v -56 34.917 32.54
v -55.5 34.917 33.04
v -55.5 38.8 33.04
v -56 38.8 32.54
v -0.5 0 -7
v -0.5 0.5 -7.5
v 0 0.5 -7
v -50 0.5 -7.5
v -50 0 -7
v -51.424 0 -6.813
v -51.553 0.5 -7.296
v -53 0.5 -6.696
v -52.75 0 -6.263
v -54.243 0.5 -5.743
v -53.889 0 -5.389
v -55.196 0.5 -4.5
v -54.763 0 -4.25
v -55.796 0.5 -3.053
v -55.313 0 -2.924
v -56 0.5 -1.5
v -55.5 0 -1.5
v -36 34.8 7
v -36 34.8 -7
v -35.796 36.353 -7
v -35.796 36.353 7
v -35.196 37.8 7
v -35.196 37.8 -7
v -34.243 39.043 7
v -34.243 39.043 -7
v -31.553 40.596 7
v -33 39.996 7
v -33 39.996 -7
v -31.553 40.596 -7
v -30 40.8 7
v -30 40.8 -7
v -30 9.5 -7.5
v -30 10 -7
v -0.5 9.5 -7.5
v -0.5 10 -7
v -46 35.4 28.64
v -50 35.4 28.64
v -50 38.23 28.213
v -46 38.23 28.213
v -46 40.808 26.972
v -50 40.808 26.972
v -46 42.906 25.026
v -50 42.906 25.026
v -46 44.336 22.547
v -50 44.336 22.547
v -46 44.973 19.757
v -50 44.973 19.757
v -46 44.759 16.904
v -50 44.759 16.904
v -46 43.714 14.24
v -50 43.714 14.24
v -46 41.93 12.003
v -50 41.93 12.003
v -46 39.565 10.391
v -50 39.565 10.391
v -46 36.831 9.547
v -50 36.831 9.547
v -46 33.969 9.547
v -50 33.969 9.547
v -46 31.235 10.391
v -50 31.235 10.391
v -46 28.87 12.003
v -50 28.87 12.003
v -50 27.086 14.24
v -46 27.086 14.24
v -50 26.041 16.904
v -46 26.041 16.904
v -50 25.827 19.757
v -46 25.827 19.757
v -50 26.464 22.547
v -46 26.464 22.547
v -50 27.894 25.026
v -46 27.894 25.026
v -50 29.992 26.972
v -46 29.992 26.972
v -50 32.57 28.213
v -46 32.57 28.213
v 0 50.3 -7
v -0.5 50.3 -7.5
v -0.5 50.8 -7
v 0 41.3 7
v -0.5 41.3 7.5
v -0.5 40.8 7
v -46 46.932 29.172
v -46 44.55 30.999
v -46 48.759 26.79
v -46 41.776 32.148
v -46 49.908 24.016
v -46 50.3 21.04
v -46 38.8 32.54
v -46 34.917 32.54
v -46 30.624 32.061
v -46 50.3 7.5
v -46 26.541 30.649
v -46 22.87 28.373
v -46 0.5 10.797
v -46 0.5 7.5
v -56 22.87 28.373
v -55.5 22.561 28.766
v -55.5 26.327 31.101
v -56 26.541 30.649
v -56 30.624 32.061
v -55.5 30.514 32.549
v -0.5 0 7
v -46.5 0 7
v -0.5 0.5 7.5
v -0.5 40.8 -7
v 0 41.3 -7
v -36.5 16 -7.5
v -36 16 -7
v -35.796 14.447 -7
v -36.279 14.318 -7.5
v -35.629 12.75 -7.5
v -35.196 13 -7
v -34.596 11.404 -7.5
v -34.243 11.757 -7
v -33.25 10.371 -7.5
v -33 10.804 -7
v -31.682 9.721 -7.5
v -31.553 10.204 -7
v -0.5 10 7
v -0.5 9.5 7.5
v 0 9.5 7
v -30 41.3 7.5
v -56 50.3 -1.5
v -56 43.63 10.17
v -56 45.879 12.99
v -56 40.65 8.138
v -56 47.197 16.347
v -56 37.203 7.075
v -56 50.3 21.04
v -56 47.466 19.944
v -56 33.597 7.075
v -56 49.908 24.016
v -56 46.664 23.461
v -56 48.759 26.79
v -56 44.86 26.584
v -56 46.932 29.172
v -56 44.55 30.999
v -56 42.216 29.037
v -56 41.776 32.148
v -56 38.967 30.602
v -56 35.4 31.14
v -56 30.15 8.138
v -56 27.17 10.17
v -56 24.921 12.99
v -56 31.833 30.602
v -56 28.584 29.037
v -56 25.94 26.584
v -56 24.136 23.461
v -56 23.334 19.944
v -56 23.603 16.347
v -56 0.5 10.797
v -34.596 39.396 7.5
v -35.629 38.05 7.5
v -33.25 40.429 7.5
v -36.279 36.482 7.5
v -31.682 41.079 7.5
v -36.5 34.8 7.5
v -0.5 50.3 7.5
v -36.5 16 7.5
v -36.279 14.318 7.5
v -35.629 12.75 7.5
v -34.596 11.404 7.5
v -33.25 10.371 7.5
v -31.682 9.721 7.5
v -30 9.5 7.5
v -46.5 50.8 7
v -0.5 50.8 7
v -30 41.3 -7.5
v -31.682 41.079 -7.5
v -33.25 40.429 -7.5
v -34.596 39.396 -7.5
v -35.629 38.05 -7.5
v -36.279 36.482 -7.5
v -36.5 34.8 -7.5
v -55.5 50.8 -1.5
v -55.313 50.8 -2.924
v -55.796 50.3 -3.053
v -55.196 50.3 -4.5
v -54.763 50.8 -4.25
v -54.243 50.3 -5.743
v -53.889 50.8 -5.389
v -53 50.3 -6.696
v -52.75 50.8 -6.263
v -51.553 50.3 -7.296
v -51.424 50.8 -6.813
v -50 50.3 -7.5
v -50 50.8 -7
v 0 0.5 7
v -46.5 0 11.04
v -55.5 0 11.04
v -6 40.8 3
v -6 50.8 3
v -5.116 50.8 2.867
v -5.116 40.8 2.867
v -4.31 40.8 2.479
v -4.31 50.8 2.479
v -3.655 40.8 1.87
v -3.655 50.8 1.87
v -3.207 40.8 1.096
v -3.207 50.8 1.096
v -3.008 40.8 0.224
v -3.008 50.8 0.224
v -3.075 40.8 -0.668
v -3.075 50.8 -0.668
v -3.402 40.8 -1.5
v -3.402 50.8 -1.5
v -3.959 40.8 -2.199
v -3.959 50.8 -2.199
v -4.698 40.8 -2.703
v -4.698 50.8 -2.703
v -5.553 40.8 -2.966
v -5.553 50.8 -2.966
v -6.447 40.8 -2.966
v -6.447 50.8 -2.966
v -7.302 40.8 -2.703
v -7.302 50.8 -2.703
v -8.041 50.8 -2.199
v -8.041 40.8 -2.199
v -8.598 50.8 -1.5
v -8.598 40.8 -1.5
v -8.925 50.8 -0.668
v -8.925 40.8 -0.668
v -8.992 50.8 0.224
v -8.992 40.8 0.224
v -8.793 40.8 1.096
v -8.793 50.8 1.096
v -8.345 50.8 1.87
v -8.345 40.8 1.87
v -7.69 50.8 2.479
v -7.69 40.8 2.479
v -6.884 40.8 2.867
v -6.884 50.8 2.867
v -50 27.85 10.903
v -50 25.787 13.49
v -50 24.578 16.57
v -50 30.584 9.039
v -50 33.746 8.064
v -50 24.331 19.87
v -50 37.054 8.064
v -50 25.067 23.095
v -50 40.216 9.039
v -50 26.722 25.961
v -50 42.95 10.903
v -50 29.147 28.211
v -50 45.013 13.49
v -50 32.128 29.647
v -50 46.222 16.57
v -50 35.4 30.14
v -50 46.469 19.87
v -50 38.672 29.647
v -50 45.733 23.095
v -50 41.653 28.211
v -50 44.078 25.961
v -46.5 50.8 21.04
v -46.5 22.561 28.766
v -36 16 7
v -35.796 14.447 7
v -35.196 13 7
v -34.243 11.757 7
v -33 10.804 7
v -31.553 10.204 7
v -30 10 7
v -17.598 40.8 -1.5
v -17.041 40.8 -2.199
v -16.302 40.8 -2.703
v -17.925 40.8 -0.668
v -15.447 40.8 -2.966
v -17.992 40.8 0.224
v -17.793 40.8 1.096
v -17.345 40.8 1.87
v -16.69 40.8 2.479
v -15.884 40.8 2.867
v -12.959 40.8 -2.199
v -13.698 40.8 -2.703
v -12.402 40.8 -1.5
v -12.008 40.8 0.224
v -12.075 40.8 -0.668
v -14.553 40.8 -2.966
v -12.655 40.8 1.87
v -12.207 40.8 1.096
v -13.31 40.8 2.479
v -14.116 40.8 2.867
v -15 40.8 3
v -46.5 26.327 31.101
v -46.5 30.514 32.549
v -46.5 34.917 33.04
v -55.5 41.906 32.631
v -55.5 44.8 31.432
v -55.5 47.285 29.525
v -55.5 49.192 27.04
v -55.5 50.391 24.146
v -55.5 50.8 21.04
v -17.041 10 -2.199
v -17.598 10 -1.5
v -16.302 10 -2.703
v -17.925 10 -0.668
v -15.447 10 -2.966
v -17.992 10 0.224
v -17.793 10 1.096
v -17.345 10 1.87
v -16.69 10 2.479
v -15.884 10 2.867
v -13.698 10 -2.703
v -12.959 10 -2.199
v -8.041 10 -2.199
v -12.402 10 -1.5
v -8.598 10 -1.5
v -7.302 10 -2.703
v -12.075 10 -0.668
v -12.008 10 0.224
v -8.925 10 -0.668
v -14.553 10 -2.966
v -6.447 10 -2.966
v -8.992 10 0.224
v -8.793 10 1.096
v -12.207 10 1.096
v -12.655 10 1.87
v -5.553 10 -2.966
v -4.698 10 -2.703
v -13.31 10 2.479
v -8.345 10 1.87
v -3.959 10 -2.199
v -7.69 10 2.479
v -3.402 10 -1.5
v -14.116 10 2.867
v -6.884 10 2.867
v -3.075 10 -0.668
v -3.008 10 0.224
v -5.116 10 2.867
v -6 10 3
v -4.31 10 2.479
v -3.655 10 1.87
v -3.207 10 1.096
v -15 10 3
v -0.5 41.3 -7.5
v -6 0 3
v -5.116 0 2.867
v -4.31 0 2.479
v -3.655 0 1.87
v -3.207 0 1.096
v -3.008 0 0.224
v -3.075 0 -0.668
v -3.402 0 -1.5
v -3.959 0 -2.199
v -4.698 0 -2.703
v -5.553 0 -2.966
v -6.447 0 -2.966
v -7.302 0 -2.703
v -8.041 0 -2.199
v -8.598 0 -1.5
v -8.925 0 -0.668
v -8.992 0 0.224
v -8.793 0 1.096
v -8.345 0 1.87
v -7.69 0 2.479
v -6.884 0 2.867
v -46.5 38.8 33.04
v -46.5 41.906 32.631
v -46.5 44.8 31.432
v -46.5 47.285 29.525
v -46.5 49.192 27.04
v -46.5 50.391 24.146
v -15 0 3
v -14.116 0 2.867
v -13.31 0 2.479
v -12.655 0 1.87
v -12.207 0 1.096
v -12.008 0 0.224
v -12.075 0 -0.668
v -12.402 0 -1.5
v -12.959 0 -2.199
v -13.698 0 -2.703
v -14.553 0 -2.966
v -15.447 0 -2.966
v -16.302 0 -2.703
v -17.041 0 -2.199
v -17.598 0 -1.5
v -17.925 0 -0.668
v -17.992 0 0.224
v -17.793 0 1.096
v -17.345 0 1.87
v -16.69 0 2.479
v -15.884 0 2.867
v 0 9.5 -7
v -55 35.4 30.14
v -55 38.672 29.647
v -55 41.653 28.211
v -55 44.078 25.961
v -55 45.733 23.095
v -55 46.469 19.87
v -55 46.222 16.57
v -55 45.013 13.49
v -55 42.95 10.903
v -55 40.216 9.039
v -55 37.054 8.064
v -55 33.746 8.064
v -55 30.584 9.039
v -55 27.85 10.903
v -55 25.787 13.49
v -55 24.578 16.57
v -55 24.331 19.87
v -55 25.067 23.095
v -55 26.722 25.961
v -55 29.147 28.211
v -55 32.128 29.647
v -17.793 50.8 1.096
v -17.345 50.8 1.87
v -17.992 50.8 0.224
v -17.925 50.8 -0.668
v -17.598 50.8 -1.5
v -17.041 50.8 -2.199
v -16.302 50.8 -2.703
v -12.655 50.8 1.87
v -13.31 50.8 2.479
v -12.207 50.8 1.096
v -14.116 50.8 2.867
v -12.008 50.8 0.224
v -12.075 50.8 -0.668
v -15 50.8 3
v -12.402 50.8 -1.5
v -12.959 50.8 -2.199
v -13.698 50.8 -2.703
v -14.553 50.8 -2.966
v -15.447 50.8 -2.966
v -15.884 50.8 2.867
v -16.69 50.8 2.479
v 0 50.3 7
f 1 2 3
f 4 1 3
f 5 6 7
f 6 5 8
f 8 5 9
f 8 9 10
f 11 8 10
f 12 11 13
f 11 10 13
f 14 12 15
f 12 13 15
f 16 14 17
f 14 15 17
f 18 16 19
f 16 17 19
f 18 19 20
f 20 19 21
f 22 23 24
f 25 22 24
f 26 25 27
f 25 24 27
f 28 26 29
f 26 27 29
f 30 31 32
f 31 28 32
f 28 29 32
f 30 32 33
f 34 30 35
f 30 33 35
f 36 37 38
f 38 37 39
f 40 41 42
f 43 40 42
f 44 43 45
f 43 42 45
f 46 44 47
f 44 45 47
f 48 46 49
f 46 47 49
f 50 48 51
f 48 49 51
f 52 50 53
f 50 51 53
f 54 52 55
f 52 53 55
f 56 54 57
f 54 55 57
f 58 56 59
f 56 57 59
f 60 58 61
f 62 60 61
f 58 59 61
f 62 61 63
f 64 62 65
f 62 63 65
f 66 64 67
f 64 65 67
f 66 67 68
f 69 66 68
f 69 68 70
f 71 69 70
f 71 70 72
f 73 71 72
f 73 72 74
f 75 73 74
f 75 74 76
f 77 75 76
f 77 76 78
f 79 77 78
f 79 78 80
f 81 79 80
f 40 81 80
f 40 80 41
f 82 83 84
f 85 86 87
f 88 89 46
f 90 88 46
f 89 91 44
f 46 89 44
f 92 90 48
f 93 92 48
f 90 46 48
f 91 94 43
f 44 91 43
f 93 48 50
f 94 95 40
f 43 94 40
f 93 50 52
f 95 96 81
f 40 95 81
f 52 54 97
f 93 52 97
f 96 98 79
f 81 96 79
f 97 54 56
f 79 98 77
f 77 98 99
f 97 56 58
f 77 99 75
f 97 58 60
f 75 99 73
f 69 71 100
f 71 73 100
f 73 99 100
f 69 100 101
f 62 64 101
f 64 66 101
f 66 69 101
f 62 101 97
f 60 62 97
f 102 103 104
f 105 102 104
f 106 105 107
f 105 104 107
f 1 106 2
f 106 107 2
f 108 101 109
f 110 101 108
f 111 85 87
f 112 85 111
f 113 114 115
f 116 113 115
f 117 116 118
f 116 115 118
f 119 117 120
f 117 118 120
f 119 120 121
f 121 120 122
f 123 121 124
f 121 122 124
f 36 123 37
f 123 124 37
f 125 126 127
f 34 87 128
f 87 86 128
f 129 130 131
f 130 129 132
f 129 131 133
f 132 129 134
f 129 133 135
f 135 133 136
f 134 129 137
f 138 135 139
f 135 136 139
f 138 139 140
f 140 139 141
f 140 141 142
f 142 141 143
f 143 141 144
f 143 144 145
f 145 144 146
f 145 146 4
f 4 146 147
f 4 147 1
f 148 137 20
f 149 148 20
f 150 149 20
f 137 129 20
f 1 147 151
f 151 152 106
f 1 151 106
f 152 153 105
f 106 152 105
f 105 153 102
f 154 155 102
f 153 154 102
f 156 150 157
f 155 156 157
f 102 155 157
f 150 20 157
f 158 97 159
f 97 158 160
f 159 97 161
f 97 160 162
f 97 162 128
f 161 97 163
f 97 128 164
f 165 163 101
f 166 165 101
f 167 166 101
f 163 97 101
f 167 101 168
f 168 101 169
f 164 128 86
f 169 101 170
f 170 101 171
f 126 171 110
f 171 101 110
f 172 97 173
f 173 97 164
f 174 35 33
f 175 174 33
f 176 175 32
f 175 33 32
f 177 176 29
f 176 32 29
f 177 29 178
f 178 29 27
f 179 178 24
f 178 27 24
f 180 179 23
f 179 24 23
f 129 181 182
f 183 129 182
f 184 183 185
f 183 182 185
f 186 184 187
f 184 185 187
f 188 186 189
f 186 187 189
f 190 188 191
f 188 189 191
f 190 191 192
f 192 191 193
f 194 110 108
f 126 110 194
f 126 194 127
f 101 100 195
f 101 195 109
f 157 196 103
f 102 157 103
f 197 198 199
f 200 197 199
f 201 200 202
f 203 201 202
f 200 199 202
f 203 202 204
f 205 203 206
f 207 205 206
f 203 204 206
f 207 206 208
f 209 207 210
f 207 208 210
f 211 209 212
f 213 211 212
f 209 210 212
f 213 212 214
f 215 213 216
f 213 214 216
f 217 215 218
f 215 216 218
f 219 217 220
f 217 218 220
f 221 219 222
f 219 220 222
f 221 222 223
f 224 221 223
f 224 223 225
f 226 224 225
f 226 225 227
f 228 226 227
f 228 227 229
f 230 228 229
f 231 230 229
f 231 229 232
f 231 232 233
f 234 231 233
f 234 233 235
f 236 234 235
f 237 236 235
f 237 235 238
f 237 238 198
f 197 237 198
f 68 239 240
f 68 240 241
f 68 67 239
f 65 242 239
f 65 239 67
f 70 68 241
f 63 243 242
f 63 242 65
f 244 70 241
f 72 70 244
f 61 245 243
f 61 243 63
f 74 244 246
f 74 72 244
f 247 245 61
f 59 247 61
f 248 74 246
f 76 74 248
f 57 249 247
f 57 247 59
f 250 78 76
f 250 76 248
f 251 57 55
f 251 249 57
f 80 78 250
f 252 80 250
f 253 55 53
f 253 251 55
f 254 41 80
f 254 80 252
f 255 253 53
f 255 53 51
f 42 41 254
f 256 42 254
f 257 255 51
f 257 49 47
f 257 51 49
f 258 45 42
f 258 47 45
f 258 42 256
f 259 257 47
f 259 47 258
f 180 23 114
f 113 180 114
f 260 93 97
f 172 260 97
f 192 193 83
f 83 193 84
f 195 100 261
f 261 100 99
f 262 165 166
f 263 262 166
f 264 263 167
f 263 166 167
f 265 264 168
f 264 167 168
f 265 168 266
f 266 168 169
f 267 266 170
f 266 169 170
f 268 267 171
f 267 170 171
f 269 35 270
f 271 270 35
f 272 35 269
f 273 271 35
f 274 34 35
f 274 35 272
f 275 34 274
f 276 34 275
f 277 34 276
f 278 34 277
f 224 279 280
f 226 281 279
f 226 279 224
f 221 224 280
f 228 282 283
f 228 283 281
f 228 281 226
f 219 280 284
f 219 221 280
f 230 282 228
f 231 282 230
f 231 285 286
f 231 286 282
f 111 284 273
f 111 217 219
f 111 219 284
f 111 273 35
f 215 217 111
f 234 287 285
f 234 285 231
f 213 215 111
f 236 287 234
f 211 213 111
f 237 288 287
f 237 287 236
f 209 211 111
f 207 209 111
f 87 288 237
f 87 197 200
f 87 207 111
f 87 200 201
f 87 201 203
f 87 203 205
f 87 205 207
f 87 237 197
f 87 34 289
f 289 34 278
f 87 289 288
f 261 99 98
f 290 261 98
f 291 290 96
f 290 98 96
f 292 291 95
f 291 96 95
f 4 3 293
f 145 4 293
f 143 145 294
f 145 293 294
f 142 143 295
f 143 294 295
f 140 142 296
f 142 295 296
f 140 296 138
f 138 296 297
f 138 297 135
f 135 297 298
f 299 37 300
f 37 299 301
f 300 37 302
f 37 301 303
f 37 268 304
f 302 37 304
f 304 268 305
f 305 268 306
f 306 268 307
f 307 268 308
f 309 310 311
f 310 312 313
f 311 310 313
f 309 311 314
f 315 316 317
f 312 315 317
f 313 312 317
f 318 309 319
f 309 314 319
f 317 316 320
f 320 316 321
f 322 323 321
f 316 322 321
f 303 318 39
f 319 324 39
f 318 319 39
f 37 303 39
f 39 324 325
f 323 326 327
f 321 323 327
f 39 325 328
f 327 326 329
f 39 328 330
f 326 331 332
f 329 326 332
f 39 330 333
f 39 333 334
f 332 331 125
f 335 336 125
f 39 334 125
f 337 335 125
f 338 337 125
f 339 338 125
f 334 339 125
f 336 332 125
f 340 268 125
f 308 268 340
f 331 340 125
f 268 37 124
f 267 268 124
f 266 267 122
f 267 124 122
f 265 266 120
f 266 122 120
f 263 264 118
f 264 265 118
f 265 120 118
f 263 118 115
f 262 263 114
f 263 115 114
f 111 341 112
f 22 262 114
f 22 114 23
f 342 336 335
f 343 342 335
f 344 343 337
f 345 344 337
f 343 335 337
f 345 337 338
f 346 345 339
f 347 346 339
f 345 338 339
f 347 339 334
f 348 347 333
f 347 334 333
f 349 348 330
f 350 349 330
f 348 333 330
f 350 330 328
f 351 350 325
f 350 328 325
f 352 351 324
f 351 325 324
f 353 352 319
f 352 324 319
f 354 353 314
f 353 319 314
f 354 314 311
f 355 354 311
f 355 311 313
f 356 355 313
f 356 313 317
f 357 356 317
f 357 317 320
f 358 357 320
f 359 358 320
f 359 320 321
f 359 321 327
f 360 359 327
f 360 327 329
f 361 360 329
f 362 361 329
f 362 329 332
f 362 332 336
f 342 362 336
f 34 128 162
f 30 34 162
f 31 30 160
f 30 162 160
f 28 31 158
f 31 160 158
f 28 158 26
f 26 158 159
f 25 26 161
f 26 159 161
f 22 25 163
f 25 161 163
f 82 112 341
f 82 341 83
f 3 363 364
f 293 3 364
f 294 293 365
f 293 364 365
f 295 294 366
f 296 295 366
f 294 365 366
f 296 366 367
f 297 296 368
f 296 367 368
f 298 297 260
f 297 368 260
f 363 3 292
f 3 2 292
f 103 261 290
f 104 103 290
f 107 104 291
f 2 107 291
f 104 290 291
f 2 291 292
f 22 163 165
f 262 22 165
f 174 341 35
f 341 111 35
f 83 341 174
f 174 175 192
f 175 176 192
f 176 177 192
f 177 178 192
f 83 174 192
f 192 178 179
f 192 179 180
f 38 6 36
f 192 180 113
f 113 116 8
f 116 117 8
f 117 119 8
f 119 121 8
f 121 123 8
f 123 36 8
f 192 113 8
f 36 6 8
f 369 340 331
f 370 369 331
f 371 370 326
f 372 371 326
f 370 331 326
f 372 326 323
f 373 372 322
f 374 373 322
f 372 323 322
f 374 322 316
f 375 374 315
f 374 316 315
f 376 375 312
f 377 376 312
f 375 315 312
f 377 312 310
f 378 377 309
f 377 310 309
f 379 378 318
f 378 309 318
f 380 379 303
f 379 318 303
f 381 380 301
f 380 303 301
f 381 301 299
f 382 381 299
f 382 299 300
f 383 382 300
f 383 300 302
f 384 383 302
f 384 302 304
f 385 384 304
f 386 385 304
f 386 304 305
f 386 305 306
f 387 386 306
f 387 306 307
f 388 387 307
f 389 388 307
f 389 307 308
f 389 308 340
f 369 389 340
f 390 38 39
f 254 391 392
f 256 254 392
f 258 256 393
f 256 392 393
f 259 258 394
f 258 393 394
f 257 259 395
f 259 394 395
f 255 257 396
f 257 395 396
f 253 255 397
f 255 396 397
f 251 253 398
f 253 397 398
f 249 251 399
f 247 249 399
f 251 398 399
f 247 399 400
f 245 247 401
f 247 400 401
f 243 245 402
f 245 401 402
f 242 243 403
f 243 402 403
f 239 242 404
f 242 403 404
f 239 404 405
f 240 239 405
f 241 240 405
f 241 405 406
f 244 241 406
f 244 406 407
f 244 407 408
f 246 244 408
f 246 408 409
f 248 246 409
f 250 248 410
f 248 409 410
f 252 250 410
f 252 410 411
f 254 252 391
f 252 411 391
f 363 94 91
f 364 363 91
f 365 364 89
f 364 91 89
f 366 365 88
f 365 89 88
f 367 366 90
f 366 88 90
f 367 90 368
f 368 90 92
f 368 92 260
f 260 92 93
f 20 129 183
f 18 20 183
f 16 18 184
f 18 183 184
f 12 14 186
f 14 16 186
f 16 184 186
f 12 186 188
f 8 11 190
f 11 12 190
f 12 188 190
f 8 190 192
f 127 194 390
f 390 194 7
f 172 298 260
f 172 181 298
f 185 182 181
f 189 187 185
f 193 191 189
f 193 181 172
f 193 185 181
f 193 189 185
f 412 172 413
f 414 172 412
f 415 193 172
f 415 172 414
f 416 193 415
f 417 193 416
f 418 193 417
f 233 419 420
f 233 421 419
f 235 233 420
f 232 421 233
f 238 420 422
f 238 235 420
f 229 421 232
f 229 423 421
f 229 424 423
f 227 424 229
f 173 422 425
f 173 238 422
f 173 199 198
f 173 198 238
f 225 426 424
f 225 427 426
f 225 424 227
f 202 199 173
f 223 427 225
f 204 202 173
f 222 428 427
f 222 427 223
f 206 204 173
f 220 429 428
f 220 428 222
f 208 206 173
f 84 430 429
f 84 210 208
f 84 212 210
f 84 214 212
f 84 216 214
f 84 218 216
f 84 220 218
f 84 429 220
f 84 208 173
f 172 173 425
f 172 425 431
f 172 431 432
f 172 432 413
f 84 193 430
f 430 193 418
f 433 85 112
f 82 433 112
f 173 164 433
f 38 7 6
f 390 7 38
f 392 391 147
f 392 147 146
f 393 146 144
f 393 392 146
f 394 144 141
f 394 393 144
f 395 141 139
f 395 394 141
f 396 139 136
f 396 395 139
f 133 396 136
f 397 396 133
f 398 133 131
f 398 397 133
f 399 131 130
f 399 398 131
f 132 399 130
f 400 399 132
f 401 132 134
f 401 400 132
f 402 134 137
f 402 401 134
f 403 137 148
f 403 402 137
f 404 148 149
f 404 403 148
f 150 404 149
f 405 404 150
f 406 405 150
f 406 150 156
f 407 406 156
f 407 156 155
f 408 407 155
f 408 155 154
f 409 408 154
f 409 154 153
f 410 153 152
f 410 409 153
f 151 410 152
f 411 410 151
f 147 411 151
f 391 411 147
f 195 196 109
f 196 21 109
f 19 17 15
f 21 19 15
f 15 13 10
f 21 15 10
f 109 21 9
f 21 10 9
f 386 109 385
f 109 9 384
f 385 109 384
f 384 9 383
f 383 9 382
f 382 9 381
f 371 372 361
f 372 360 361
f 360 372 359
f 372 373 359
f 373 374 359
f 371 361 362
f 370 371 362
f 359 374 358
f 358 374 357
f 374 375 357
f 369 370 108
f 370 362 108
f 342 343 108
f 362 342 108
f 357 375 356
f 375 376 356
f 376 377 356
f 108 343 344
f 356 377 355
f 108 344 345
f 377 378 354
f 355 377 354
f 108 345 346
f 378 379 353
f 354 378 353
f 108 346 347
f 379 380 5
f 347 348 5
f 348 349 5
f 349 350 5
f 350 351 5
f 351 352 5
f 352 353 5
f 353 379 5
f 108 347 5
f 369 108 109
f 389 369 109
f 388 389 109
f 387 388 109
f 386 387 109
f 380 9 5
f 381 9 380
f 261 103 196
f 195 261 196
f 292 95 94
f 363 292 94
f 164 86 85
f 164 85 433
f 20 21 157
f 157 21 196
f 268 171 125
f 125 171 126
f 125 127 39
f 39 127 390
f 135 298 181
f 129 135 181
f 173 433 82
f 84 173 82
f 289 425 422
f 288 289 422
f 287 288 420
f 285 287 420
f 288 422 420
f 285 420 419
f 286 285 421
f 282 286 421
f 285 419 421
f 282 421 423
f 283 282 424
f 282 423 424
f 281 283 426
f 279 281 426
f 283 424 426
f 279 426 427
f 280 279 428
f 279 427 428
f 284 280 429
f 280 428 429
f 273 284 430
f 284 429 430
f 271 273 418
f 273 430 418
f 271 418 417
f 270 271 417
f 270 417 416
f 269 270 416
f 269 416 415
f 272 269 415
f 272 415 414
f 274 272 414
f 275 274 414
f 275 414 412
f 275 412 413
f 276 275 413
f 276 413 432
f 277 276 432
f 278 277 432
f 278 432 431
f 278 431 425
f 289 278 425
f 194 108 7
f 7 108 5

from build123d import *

# Parameters (mm, degrees)
BOSS_EXTRUDE1_DEPTH = 50.8
SKETCH2_R           = 11.1
CUT_EXTRUDE1_DEPTH  = 6
SKETCH4_R           = 9.6
CUT_EXTRUDE2_DEPTH  = 79.563869558
SKETCH5_R           = 3
CUT_EXTRUDE3_DEPTH  = 83.512311809
CUT_EXTRUDE4_DEPTH  = 83.512311809
FILLET3_R           = 20
FILLET4_R           = 12
SKETCH8_W           = 36
SKETCH8_H           = 30.8
CUT_EXTRUDE5_DEPTH  = 80.805586271
CHAMFER2_SIZE       = 1
FILLET6_R           = 6
FILLET5_R           = 6
CHAMFER3_SIZE       = 0.5


with BuildPart() as part:
    # Sketch1 → Boss-Extrude1 (new body)
    with BuildSketch(Plane(origin=(0, 0, 0), x_dir=(1, 0, 0), z_dir=(0, 1, 0))):
        Polygon((-56, 7.5), (-56, -33.04), (-46, -33.04), (-46, -7.5), (0, -7.5), (0, 7.5), align=None)
    extrude(amount=BOSS_EXTRUDE1_DEPTH)

    # Sketch2 → Cut-Extrude1 (cut)
    with BuildSketch(Plane.ZY.offset(56)):
        with Locations((19.04, 35.4)):
            Circle(SKETCH2_R)
    extrude(amount=-CUT_EXTRUDE1_DEPTH, mode=Mode.SUBTRACT)

    # Sketch4 → Cut-Extrude2 (cut, through all)
    with BuildSketch(Plane.ZY.offset(50)):
        with Locations((19.04, 35.4)):
            Circle(SKETCH4_R)
    extrude(amount=-CUT_EXTRUDE2_DEPTH, mode=Mode.SUBTRACT)

    # Sketch5 → Cut-Extrude3 (cut, through all)
    with BuildSketch(Plane(origin=(0, 50.8, 0), x_dir=(1, 0, 0), z_dir=(0, 1, 0))):
        with Locations(Location((-6, 0, 0), (0, 0, 270))):
            Circle(SKETCH5_R)
        with Locations(Location((-15, 0, 0), (0, 0, 270))):
            Circle(SKETCH5_R)
    extrude(amount=-CUT_EXTRUDE3_DEPTH, mode=Mode.SUBTRACT)

    # Sketch6 → Cut-Extrude4 (cut, through all)
    with BuildSketch(Plane.ZY.offset(56)):
        Polygon((11.04, 0), (33.04, 0), (33.04, 28), align=None)
    extrude(amount=-CUT_EXTRUDE4_DEPTH, mode=Mode.SUBTRACT)

    # Fillet3
    fillet3_edges = [part.edges().sort_by_distance(p)[0] for p in [
        (-51, 28, 33.04),
    ]]
    fillet(fillet3_edges, radius=FILLET3_R)

    # Fillet4
    fillet4_edges = [part.edges().sort_by_distance(p)[0] for p in [
        (-51, 50.8, 33.04),
    ]]
    fillet(fillet4_edges, radius=FILLET4_R)

    # Sketch8 → Cut-Extrude5 (cut, through all)
    with BuildSketch(Plane.XY.offset(7.5)):
        with Locations((-18, 25.4)):
            Rectangle(SKETCH8_W, SKETCH8_H)
    extrude(amount=-CUT_EXTRUDE5_DEPTH, mode=Mode.SUBTRACT)

    # Chamfer2
    chamfer2_edges = [part.edges().sort_by_distance(p)[0] for p in [
        (-56, 35.4, 7.94),
    ]]
    chamfer(chamfer2_edges, length=CHAMFER2_SIZE)

    # Fillet6
    fillet6_edges = [part.edges().sort_by_distance(p)[0] for p in [
        (-56, 25.4, -7.5),
    ]]
    fillet(fillet6_edges, radius=FILLET6_R)

    # Fillet5
    fillet5_edges = [part.edges().sort_by_distance(p)[0] for p in [
        (-36, 40.8, 0),
        (-36, 10, 0),
    ]]
    fillet(fillet5_edges, radius=FILLET5_R)

    # Chamfer3
    chamfer3_edges = [part.edges().sort_by_distance(p)[0] for p in [
        (-54.242640687, 50.8, -5.742640687),
        (-15, 10, 7.5),
        (-15, 10, -7.5),
        (-36, 25.4, 7.5),
        (-36, 25.4, -7.5),
        (-34.242640687, 11.757359313, 7.5),
        (-34.242640687, 11.757359313, -7.5),
        (-34.242640687, 39.042640687, 7.5),
        (0, 45.8, 7.5),
        (-34.242640687, 39.042640687, -7.5),
        (0, 45.8, -7.5),
        (-46, 50.8, 14.27),
        (-23, 50.8, 7.5),
        (-46, 11.280415221, 19.903183388),
        (0, 50.8, 0),
        (-56, 11.280415221, 19.903183388),
        (-56, 28.37995835, 31.941419729),
        (-46, 28.37995835, 31.941419729),
        (-46, 36.858630741, 33.04),
        (-46, 47.285281374, 29.525281374),
        (-56, 36.858630741, 33.04),
        (-56, 47.285281374, 29.525281374),
        (-23, 0, 7.5),
        (-46, 0, 9.27),
        (0, 5, 7.5),
        (0, 5, -7.5),
        (0, 10, 0),
        (-15, 40.8, -7.5),
        (0, 40.8, 0),
        (-15, 40.8, 7.5),
        (-25, 0, -7.5),
        (0, 0, 0),
        (-25, 50.8, -7.5),
        (-56, 50.8, 9.77),
        (-56, 0, 4.77),
        (-54.242640687, 0, -5.742640687),
    ]]
    chamfer(chamfer3_edges, length=CHAMFER3_SIZE)


solid = part.part
